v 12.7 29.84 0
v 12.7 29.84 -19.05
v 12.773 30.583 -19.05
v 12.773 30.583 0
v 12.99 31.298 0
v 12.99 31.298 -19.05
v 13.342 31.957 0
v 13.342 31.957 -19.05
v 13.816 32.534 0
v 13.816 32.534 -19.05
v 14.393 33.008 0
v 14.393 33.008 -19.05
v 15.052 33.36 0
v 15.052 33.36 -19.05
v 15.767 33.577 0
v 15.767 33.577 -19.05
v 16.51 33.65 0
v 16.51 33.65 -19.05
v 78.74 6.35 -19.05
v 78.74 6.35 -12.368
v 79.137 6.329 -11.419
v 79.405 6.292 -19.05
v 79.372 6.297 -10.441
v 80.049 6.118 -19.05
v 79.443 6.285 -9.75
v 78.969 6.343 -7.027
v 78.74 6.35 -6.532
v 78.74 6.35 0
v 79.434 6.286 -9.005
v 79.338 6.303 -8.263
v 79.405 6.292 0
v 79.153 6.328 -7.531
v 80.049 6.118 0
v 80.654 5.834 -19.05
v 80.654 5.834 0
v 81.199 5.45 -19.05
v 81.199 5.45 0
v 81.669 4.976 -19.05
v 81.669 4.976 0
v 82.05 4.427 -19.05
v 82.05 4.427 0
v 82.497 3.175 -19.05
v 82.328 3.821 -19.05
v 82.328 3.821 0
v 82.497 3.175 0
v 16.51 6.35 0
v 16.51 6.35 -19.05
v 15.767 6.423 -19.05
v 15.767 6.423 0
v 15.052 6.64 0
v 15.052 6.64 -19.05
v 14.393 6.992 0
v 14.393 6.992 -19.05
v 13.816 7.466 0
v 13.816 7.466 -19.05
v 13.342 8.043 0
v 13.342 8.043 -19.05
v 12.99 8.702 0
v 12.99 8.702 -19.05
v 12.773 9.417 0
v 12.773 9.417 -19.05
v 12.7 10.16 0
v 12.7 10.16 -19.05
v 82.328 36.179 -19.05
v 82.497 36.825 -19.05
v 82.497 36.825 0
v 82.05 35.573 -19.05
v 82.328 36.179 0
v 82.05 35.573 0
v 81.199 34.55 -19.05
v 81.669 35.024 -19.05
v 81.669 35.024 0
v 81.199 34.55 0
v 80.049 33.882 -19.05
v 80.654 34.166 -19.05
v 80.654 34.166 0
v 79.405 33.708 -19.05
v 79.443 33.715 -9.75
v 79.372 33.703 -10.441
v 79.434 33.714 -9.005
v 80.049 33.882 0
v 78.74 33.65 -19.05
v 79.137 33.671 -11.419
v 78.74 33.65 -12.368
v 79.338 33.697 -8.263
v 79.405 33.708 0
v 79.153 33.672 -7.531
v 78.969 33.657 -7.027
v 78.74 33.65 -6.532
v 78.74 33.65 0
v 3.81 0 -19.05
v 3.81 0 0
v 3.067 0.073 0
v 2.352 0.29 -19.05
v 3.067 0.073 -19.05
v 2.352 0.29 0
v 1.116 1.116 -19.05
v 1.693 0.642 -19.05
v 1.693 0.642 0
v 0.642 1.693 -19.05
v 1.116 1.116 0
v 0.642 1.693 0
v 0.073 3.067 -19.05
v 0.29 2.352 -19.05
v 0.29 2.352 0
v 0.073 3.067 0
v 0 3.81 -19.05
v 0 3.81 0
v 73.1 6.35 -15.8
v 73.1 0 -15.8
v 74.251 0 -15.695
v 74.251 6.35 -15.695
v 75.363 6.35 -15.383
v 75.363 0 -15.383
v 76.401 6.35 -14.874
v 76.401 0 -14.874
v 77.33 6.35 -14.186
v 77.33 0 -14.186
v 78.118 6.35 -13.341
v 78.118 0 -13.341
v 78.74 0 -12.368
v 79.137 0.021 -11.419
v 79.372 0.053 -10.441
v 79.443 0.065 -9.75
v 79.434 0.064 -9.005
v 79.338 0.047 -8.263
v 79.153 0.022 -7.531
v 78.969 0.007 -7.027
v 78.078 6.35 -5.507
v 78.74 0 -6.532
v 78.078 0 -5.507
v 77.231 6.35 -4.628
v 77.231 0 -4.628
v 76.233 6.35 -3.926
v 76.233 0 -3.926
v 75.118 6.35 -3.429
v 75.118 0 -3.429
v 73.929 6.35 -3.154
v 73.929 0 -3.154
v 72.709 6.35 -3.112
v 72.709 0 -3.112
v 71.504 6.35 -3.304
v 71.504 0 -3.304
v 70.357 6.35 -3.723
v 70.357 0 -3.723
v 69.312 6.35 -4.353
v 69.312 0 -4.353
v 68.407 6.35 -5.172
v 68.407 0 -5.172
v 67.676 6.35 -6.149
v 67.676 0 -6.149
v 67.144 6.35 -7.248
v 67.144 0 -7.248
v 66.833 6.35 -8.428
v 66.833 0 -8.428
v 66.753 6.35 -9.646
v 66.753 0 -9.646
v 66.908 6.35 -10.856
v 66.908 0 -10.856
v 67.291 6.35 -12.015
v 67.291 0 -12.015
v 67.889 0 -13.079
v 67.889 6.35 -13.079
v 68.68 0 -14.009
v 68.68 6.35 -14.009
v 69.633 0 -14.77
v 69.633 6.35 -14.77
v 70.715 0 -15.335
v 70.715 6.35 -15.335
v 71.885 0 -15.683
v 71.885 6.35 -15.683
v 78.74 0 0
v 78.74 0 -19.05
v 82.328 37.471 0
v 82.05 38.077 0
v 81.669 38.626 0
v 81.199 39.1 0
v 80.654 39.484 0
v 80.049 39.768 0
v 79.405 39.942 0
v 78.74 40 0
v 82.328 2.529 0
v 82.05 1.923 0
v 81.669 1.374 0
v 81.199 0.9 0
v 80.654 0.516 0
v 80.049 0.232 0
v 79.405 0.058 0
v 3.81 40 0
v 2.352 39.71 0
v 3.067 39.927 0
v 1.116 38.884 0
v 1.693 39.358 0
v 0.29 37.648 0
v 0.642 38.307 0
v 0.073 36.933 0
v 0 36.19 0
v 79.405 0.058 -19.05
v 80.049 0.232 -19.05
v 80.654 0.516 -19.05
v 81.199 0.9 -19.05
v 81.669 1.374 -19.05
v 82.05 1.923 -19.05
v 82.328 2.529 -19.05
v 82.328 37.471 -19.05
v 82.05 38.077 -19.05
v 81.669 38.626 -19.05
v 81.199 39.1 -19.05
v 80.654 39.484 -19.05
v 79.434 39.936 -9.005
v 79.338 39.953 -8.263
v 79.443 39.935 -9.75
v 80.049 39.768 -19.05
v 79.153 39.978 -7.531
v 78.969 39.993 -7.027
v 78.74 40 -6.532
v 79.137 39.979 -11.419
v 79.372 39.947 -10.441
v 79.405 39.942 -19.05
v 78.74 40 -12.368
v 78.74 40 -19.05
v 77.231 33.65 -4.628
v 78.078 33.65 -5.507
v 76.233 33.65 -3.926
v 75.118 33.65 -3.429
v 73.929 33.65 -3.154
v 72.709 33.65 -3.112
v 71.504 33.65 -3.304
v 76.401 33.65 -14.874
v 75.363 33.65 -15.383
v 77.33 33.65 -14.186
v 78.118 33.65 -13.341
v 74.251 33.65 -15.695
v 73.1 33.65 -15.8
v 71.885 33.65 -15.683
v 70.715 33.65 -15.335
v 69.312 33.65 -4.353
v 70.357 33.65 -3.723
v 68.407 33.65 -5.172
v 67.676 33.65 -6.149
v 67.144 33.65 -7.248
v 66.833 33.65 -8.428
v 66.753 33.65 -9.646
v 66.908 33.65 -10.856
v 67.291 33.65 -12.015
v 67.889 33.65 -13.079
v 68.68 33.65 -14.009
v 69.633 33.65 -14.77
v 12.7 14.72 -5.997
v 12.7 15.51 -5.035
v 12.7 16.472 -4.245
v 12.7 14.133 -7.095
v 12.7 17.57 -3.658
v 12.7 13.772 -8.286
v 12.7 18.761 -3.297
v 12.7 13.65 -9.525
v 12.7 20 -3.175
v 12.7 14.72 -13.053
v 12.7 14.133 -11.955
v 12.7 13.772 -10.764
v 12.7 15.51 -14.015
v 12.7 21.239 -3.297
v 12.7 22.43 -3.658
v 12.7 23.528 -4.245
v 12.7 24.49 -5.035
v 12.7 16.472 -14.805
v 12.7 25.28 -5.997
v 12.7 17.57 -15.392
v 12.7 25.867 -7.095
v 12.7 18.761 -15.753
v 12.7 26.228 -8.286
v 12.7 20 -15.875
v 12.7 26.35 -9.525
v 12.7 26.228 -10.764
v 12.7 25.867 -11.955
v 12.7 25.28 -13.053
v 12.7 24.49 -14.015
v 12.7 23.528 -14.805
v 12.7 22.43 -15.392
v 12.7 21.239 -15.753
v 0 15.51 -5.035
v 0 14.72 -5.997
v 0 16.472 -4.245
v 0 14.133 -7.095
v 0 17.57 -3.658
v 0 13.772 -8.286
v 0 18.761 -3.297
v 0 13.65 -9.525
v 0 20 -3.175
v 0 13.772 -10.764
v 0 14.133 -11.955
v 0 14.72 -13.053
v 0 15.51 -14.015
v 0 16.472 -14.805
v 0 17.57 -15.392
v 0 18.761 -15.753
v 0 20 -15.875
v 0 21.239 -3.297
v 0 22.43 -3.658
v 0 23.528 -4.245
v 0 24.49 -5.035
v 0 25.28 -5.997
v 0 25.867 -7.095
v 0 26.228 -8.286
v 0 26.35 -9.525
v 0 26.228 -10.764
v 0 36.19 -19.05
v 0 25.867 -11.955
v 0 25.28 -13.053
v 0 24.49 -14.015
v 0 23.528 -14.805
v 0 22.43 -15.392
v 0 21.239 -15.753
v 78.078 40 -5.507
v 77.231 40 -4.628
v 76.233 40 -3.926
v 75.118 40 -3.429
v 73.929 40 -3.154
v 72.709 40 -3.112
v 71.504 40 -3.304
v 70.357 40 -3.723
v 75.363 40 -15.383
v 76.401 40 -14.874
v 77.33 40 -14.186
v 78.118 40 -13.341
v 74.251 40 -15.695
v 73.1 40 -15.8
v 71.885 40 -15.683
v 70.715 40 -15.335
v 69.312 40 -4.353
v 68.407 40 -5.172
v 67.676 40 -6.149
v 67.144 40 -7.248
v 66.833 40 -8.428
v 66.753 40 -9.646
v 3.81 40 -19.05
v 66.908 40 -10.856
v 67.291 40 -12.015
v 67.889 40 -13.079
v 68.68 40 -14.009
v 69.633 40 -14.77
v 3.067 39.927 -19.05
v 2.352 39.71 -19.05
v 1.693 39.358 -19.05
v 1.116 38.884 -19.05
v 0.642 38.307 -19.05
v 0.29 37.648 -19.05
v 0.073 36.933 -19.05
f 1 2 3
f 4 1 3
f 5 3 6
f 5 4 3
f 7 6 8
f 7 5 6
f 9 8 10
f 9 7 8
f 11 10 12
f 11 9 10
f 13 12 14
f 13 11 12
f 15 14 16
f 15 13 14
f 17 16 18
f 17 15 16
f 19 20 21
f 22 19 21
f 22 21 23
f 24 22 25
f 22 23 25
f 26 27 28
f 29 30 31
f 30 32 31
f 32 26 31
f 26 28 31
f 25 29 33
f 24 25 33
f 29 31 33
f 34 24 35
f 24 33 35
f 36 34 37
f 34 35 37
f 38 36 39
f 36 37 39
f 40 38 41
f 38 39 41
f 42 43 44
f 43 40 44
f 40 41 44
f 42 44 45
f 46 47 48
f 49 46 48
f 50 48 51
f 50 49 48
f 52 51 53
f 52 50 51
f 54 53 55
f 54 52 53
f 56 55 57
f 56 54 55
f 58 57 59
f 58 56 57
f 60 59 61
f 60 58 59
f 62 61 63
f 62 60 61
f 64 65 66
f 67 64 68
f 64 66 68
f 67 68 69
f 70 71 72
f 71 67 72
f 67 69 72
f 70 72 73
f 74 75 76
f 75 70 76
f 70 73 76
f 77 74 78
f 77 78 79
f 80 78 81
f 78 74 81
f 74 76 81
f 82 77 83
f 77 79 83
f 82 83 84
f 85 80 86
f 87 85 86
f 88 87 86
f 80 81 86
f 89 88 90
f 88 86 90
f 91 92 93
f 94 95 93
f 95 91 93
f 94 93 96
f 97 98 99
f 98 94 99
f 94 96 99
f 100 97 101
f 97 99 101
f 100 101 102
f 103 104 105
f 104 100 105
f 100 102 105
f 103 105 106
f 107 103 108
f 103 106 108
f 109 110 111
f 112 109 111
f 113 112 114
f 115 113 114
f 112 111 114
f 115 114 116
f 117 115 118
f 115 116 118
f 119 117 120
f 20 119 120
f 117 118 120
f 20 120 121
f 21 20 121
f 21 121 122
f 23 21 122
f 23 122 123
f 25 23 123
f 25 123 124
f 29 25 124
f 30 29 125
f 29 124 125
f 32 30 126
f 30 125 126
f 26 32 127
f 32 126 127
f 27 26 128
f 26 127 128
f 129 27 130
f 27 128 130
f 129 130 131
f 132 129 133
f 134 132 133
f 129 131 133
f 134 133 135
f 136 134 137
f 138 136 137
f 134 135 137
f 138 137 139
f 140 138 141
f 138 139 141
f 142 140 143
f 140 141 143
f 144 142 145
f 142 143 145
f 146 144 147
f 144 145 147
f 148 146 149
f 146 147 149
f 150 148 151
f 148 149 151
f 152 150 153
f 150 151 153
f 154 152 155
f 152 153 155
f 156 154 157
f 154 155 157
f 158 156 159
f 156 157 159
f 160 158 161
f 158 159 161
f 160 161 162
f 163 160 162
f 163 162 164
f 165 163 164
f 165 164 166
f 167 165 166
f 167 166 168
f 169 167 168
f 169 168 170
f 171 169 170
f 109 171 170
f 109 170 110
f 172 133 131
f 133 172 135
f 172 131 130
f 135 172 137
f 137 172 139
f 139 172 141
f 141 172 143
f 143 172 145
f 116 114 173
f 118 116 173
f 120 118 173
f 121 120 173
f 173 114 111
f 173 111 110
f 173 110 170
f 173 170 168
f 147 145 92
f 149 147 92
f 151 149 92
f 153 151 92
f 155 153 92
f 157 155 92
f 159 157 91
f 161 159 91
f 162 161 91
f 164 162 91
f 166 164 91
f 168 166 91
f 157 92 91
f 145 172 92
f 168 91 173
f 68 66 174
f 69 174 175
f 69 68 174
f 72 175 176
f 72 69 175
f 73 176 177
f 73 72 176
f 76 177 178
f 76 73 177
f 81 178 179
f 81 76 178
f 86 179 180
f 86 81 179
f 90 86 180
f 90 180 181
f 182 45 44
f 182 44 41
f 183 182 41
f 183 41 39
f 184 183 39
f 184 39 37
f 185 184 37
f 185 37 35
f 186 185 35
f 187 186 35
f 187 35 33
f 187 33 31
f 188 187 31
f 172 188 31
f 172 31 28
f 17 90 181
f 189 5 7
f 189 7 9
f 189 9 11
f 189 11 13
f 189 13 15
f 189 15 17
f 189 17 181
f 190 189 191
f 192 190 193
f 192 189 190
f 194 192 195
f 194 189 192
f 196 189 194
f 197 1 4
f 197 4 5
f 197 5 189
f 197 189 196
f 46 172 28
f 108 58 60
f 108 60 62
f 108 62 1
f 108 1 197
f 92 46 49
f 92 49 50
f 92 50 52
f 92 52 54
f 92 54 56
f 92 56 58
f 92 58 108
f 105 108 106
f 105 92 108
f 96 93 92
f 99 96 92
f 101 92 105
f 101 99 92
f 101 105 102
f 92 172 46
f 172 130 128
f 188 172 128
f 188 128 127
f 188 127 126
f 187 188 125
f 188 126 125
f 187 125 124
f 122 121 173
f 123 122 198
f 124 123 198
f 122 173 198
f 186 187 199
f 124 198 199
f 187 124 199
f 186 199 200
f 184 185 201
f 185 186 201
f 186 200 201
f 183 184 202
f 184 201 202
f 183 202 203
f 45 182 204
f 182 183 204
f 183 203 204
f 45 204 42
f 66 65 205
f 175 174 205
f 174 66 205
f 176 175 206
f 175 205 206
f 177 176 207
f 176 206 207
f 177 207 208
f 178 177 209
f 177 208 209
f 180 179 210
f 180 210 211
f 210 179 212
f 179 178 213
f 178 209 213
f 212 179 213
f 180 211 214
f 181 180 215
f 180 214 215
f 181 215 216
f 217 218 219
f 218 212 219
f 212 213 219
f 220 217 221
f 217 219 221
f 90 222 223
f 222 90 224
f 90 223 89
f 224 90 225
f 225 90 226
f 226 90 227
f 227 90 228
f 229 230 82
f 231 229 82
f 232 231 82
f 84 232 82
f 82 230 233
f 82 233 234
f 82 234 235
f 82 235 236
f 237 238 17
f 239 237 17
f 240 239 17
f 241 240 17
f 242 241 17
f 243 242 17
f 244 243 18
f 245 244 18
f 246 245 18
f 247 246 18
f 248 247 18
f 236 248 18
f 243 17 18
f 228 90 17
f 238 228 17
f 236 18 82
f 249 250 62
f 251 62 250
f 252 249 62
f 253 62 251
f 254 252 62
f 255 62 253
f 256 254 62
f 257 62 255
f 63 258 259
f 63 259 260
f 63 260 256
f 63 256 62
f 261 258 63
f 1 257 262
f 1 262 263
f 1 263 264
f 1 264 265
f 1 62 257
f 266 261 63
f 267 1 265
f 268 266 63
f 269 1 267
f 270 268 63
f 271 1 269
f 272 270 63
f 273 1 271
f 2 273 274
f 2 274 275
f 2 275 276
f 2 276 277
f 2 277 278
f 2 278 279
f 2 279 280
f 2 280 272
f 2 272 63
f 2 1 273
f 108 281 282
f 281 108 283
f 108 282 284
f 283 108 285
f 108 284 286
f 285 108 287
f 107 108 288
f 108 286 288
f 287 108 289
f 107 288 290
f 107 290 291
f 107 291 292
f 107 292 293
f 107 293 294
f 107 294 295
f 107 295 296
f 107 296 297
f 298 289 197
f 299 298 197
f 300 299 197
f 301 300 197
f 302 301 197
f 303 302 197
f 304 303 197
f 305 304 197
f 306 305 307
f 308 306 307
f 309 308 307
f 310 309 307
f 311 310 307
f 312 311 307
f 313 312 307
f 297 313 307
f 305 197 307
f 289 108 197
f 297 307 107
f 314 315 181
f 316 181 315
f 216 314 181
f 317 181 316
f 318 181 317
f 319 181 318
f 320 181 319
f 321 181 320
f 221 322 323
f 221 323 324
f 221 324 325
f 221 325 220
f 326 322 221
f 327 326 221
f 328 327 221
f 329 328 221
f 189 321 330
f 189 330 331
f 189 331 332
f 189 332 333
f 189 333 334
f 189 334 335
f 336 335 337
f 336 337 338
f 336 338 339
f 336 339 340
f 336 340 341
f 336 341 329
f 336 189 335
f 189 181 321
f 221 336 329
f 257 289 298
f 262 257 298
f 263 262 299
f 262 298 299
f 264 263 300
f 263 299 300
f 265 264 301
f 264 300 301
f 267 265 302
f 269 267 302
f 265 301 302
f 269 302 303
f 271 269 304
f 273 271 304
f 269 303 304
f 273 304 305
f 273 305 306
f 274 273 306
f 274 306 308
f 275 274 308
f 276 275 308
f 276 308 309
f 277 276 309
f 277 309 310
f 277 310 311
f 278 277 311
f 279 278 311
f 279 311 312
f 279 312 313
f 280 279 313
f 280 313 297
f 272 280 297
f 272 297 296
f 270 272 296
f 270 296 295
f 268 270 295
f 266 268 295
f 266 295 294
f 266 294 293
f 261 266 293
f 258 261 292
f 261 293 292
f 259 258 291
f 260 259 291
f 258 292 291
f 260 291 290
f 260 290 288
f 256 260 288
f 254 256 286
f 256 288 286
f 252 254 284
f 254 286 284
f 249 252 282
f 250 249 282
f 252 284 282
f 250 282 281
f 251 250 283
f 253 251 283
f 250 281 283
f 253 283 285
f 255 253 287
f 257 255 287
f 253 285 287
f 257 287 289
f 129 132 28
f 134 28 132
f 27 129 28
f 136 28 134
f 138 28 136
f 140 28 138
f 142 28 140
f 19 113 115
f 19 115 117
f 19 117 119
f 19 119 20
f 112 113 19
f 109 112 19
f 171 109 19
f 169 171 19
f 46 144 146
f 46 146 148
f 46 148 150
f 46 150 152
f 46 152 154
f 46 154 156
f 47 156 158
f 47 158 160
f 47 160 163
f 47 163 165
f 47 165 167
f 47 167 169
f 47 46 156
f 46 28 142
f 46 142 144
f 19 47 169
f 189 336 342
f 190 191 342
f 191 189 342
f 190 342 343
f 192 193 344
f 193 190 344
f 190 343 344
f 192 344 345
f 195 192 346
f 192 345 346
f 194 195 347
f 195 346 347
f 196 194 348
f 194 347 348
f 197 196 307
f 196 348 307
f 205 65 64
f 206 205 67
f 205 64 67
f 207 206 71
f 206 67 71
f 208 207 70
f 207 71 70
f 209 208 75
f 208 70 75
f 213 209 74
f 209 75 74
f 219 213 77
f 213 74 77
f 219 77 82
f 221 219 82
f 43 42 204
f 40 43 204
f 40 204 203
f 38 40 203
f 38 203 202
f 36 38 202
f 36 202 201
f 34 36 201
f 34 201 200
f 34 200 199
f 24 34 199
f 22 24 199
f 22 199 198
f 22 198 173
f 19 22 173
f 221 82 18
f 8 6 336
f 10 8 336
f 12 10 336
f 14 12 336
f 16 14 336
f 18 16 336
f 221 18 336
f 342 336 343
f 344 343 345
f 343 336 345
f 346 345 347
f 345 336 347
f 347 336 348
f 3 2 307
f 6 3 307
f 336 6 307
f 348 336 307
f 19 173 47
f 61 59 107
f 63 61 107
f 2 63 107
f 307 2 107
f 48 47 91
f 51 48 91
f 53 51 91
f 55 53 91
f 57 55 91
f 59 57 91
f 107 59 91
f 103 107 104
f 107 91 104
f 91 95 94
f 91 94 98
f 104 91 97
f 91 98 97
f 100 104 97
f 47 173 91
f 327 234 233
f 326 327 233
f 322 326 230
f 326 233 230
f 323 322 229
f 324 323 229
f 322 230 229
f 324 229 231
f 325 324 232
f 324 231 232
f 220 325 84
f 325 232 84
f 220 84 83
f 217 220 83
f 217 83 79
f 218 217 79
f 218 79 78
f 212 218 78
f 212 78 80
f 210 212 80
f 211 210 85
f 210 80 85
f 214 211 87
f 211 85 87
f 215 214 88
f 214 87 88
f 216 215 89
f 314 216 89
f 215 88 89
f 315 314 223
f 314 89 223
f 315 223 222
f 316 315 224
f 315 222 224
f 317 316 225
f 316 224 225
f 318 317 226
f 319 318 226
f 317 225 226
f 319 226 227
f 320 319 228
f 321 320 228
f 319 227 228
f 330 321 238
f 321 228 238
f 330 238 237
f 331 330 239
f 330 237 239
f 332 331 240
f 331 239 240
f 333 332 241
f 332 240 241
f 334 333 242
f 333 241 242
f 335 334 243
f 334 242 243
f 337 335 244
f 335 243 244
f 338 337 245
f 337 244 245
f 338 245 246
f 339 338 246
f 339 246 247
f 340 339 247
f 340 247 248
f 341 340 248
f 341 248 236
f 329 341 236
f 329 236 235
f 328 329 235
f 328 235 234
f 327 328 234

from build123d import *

# Parameters (mm, degrees)
SKETCH1_W           = 19.05
SKETCH1_H           = 40
BOSS_EXTRUDE1_DEPTH = 12.7
SKETCH2_W           = 19.05
SKETCH2_H           = 6.35
BOSS_EXTRUDE2_DEPTH = 69.85
CUT_EXTRUDE1_REACH  = 95.688
SKETCH5_R           = 6.35
SKETCH6_R           = 6.35
CUT_EXTRUDE2_DEPTH  = 94.687806037
FILLET4_R           = 3.81


with BuildPart() as part:
    # Sketch1 → Boss-Extrude1 (new body)
    with BuildSketch(Plane(origin=(0, 0, 0), x_dir=(0, 0, -1), z_dir=(1, 0, 0))):
        with Locations((9.525, 20)):
            Rectangle(SKETCH1_W, SKETCH1_H)
    extrude(amount=BOSS_EXTRUDE1_DEPTH)

    # Sketch2 → Boss-Extrude2 (add)
    with BuildSketch(Plane(origin=(12.7, 0, 0), x_dir=(0, 0, -1), z_dir=(1, 0, 0))):
        with Locations((9.525, 3.175)):
            Rectangle(SKETCH2_W, SKETCH2_H)
        with Locations((9.525, 36.825)):
            Rectangle(SKETCH2_W, SKETCH2_H)
    extrude(amount=BOSS_EXTRUDE2_DEPTH)

    # Sketch5 → Cut-Extrude1 (cut, up to next)
    with BuildSketch(Plane.ZY, mode=Mode.PRIVATE) as cut_extrude1_sk1:
        with Locations((-9.525, 20)):
            Circle(SKETCH5_R)
    cut_extrude1_tool1 = extrude(cut_extrude1_sk1.sketch, amount=-CUT_EXTRUDE1_REACH, mode=Mode.PRIVATE) & part.part
    add(cut_extrude1_tool1.solids().sort_by_distance((0, 20, -9.525))[0], mode=Mode.SUBTRACT)

    # Sketch6 → Cut-Extrude2 (cut, through all)
    with BuildSketch(Plane.XZ):
        with Locations(Location((73.1, -9.45, 0), (0, 0, 270))):
            Circle(SKETCH6_R)
    extrude(amount=-CUT_EXTRUDE2_DEPTH, mode=Mode.SUBTRACT)

    # Fillet4
    # the kernel refuses this fillet: 3.81 mm, written as the material it adds along each edge
    with BuildSketch(Plane(origin=(12.7, 33.65, 0), x_dir=(1, 0, 0), z_dir=(0, 0, -1)), Plane(origin=(12.7, 6.35, 0), x_dir=(0, 1, 0), z_dir=(0, 0, -1))) as fillet4_piece_1:
        with BuildLine():
            CenterArc((FILLET4_R, FILLET4_R), FILLET4_R, 180, 90)
            Line((0, FILLET4_R), (0, 0))
            Line((0, 0), (FILLET4_R, 0))
        make_face()
    extrude(amount=19.05)
    # the kernel refuses this fillet: 3.81 mm, written as the material it takes off along each edge
    with BuildSketch(Plane(origin=(0, 0, 9.525), x_dir=(1, 0, 0), z_dir=(0, 0, -1)), Plane(origin=(82.55, 0, -28.575), x_dir=(-1, 0, 0), z_dir=(0, 0, 1)), Plane(origin=(82.55, 33.65, 9.525), x_dir=(0, 1, 0), z_dir=(0, 0, -1))) as fillet4_2_piece_1:
        with BuildLine():
            CenterArc((FILLET4_R, -FILLET4_R), FILLET4_R, 90, 90)
            Line((0, -FILLET4_R), (0, 0))
            Line((0, 0), (FILLET4_R, 0))
        make_face()
    extrude(amount=38.1, mode=Mode.SUBTRACT)
    with BuildSketch(Plane(origin=(0, 40, -28.575), x_dir=(0, -1, 0), z_dir=(0, 0, 1)), Plane(origin=(82.55, 6.35, 9.525), x_dir=(0, -1, 0), z_dir=(0, 0, -1)), Plane(origin=(82.55, 40, -28.575), x_dir=(-1, 0, 0), z_dir=(0, 0, 1))) as fillet4_2_piece_2:
        with BuildLine():
            CenterArc((FILLET4_R, FILLET4_R), FILLET4_R, 180, 90)
            Line((0, FILLET4_R), (0, 0))
            Line((0, 0), (FILLET4_R, 0))
        make_face()
    extrude(amount=38.1, mode=Mode.SUBTRACT)


solid = part.part
